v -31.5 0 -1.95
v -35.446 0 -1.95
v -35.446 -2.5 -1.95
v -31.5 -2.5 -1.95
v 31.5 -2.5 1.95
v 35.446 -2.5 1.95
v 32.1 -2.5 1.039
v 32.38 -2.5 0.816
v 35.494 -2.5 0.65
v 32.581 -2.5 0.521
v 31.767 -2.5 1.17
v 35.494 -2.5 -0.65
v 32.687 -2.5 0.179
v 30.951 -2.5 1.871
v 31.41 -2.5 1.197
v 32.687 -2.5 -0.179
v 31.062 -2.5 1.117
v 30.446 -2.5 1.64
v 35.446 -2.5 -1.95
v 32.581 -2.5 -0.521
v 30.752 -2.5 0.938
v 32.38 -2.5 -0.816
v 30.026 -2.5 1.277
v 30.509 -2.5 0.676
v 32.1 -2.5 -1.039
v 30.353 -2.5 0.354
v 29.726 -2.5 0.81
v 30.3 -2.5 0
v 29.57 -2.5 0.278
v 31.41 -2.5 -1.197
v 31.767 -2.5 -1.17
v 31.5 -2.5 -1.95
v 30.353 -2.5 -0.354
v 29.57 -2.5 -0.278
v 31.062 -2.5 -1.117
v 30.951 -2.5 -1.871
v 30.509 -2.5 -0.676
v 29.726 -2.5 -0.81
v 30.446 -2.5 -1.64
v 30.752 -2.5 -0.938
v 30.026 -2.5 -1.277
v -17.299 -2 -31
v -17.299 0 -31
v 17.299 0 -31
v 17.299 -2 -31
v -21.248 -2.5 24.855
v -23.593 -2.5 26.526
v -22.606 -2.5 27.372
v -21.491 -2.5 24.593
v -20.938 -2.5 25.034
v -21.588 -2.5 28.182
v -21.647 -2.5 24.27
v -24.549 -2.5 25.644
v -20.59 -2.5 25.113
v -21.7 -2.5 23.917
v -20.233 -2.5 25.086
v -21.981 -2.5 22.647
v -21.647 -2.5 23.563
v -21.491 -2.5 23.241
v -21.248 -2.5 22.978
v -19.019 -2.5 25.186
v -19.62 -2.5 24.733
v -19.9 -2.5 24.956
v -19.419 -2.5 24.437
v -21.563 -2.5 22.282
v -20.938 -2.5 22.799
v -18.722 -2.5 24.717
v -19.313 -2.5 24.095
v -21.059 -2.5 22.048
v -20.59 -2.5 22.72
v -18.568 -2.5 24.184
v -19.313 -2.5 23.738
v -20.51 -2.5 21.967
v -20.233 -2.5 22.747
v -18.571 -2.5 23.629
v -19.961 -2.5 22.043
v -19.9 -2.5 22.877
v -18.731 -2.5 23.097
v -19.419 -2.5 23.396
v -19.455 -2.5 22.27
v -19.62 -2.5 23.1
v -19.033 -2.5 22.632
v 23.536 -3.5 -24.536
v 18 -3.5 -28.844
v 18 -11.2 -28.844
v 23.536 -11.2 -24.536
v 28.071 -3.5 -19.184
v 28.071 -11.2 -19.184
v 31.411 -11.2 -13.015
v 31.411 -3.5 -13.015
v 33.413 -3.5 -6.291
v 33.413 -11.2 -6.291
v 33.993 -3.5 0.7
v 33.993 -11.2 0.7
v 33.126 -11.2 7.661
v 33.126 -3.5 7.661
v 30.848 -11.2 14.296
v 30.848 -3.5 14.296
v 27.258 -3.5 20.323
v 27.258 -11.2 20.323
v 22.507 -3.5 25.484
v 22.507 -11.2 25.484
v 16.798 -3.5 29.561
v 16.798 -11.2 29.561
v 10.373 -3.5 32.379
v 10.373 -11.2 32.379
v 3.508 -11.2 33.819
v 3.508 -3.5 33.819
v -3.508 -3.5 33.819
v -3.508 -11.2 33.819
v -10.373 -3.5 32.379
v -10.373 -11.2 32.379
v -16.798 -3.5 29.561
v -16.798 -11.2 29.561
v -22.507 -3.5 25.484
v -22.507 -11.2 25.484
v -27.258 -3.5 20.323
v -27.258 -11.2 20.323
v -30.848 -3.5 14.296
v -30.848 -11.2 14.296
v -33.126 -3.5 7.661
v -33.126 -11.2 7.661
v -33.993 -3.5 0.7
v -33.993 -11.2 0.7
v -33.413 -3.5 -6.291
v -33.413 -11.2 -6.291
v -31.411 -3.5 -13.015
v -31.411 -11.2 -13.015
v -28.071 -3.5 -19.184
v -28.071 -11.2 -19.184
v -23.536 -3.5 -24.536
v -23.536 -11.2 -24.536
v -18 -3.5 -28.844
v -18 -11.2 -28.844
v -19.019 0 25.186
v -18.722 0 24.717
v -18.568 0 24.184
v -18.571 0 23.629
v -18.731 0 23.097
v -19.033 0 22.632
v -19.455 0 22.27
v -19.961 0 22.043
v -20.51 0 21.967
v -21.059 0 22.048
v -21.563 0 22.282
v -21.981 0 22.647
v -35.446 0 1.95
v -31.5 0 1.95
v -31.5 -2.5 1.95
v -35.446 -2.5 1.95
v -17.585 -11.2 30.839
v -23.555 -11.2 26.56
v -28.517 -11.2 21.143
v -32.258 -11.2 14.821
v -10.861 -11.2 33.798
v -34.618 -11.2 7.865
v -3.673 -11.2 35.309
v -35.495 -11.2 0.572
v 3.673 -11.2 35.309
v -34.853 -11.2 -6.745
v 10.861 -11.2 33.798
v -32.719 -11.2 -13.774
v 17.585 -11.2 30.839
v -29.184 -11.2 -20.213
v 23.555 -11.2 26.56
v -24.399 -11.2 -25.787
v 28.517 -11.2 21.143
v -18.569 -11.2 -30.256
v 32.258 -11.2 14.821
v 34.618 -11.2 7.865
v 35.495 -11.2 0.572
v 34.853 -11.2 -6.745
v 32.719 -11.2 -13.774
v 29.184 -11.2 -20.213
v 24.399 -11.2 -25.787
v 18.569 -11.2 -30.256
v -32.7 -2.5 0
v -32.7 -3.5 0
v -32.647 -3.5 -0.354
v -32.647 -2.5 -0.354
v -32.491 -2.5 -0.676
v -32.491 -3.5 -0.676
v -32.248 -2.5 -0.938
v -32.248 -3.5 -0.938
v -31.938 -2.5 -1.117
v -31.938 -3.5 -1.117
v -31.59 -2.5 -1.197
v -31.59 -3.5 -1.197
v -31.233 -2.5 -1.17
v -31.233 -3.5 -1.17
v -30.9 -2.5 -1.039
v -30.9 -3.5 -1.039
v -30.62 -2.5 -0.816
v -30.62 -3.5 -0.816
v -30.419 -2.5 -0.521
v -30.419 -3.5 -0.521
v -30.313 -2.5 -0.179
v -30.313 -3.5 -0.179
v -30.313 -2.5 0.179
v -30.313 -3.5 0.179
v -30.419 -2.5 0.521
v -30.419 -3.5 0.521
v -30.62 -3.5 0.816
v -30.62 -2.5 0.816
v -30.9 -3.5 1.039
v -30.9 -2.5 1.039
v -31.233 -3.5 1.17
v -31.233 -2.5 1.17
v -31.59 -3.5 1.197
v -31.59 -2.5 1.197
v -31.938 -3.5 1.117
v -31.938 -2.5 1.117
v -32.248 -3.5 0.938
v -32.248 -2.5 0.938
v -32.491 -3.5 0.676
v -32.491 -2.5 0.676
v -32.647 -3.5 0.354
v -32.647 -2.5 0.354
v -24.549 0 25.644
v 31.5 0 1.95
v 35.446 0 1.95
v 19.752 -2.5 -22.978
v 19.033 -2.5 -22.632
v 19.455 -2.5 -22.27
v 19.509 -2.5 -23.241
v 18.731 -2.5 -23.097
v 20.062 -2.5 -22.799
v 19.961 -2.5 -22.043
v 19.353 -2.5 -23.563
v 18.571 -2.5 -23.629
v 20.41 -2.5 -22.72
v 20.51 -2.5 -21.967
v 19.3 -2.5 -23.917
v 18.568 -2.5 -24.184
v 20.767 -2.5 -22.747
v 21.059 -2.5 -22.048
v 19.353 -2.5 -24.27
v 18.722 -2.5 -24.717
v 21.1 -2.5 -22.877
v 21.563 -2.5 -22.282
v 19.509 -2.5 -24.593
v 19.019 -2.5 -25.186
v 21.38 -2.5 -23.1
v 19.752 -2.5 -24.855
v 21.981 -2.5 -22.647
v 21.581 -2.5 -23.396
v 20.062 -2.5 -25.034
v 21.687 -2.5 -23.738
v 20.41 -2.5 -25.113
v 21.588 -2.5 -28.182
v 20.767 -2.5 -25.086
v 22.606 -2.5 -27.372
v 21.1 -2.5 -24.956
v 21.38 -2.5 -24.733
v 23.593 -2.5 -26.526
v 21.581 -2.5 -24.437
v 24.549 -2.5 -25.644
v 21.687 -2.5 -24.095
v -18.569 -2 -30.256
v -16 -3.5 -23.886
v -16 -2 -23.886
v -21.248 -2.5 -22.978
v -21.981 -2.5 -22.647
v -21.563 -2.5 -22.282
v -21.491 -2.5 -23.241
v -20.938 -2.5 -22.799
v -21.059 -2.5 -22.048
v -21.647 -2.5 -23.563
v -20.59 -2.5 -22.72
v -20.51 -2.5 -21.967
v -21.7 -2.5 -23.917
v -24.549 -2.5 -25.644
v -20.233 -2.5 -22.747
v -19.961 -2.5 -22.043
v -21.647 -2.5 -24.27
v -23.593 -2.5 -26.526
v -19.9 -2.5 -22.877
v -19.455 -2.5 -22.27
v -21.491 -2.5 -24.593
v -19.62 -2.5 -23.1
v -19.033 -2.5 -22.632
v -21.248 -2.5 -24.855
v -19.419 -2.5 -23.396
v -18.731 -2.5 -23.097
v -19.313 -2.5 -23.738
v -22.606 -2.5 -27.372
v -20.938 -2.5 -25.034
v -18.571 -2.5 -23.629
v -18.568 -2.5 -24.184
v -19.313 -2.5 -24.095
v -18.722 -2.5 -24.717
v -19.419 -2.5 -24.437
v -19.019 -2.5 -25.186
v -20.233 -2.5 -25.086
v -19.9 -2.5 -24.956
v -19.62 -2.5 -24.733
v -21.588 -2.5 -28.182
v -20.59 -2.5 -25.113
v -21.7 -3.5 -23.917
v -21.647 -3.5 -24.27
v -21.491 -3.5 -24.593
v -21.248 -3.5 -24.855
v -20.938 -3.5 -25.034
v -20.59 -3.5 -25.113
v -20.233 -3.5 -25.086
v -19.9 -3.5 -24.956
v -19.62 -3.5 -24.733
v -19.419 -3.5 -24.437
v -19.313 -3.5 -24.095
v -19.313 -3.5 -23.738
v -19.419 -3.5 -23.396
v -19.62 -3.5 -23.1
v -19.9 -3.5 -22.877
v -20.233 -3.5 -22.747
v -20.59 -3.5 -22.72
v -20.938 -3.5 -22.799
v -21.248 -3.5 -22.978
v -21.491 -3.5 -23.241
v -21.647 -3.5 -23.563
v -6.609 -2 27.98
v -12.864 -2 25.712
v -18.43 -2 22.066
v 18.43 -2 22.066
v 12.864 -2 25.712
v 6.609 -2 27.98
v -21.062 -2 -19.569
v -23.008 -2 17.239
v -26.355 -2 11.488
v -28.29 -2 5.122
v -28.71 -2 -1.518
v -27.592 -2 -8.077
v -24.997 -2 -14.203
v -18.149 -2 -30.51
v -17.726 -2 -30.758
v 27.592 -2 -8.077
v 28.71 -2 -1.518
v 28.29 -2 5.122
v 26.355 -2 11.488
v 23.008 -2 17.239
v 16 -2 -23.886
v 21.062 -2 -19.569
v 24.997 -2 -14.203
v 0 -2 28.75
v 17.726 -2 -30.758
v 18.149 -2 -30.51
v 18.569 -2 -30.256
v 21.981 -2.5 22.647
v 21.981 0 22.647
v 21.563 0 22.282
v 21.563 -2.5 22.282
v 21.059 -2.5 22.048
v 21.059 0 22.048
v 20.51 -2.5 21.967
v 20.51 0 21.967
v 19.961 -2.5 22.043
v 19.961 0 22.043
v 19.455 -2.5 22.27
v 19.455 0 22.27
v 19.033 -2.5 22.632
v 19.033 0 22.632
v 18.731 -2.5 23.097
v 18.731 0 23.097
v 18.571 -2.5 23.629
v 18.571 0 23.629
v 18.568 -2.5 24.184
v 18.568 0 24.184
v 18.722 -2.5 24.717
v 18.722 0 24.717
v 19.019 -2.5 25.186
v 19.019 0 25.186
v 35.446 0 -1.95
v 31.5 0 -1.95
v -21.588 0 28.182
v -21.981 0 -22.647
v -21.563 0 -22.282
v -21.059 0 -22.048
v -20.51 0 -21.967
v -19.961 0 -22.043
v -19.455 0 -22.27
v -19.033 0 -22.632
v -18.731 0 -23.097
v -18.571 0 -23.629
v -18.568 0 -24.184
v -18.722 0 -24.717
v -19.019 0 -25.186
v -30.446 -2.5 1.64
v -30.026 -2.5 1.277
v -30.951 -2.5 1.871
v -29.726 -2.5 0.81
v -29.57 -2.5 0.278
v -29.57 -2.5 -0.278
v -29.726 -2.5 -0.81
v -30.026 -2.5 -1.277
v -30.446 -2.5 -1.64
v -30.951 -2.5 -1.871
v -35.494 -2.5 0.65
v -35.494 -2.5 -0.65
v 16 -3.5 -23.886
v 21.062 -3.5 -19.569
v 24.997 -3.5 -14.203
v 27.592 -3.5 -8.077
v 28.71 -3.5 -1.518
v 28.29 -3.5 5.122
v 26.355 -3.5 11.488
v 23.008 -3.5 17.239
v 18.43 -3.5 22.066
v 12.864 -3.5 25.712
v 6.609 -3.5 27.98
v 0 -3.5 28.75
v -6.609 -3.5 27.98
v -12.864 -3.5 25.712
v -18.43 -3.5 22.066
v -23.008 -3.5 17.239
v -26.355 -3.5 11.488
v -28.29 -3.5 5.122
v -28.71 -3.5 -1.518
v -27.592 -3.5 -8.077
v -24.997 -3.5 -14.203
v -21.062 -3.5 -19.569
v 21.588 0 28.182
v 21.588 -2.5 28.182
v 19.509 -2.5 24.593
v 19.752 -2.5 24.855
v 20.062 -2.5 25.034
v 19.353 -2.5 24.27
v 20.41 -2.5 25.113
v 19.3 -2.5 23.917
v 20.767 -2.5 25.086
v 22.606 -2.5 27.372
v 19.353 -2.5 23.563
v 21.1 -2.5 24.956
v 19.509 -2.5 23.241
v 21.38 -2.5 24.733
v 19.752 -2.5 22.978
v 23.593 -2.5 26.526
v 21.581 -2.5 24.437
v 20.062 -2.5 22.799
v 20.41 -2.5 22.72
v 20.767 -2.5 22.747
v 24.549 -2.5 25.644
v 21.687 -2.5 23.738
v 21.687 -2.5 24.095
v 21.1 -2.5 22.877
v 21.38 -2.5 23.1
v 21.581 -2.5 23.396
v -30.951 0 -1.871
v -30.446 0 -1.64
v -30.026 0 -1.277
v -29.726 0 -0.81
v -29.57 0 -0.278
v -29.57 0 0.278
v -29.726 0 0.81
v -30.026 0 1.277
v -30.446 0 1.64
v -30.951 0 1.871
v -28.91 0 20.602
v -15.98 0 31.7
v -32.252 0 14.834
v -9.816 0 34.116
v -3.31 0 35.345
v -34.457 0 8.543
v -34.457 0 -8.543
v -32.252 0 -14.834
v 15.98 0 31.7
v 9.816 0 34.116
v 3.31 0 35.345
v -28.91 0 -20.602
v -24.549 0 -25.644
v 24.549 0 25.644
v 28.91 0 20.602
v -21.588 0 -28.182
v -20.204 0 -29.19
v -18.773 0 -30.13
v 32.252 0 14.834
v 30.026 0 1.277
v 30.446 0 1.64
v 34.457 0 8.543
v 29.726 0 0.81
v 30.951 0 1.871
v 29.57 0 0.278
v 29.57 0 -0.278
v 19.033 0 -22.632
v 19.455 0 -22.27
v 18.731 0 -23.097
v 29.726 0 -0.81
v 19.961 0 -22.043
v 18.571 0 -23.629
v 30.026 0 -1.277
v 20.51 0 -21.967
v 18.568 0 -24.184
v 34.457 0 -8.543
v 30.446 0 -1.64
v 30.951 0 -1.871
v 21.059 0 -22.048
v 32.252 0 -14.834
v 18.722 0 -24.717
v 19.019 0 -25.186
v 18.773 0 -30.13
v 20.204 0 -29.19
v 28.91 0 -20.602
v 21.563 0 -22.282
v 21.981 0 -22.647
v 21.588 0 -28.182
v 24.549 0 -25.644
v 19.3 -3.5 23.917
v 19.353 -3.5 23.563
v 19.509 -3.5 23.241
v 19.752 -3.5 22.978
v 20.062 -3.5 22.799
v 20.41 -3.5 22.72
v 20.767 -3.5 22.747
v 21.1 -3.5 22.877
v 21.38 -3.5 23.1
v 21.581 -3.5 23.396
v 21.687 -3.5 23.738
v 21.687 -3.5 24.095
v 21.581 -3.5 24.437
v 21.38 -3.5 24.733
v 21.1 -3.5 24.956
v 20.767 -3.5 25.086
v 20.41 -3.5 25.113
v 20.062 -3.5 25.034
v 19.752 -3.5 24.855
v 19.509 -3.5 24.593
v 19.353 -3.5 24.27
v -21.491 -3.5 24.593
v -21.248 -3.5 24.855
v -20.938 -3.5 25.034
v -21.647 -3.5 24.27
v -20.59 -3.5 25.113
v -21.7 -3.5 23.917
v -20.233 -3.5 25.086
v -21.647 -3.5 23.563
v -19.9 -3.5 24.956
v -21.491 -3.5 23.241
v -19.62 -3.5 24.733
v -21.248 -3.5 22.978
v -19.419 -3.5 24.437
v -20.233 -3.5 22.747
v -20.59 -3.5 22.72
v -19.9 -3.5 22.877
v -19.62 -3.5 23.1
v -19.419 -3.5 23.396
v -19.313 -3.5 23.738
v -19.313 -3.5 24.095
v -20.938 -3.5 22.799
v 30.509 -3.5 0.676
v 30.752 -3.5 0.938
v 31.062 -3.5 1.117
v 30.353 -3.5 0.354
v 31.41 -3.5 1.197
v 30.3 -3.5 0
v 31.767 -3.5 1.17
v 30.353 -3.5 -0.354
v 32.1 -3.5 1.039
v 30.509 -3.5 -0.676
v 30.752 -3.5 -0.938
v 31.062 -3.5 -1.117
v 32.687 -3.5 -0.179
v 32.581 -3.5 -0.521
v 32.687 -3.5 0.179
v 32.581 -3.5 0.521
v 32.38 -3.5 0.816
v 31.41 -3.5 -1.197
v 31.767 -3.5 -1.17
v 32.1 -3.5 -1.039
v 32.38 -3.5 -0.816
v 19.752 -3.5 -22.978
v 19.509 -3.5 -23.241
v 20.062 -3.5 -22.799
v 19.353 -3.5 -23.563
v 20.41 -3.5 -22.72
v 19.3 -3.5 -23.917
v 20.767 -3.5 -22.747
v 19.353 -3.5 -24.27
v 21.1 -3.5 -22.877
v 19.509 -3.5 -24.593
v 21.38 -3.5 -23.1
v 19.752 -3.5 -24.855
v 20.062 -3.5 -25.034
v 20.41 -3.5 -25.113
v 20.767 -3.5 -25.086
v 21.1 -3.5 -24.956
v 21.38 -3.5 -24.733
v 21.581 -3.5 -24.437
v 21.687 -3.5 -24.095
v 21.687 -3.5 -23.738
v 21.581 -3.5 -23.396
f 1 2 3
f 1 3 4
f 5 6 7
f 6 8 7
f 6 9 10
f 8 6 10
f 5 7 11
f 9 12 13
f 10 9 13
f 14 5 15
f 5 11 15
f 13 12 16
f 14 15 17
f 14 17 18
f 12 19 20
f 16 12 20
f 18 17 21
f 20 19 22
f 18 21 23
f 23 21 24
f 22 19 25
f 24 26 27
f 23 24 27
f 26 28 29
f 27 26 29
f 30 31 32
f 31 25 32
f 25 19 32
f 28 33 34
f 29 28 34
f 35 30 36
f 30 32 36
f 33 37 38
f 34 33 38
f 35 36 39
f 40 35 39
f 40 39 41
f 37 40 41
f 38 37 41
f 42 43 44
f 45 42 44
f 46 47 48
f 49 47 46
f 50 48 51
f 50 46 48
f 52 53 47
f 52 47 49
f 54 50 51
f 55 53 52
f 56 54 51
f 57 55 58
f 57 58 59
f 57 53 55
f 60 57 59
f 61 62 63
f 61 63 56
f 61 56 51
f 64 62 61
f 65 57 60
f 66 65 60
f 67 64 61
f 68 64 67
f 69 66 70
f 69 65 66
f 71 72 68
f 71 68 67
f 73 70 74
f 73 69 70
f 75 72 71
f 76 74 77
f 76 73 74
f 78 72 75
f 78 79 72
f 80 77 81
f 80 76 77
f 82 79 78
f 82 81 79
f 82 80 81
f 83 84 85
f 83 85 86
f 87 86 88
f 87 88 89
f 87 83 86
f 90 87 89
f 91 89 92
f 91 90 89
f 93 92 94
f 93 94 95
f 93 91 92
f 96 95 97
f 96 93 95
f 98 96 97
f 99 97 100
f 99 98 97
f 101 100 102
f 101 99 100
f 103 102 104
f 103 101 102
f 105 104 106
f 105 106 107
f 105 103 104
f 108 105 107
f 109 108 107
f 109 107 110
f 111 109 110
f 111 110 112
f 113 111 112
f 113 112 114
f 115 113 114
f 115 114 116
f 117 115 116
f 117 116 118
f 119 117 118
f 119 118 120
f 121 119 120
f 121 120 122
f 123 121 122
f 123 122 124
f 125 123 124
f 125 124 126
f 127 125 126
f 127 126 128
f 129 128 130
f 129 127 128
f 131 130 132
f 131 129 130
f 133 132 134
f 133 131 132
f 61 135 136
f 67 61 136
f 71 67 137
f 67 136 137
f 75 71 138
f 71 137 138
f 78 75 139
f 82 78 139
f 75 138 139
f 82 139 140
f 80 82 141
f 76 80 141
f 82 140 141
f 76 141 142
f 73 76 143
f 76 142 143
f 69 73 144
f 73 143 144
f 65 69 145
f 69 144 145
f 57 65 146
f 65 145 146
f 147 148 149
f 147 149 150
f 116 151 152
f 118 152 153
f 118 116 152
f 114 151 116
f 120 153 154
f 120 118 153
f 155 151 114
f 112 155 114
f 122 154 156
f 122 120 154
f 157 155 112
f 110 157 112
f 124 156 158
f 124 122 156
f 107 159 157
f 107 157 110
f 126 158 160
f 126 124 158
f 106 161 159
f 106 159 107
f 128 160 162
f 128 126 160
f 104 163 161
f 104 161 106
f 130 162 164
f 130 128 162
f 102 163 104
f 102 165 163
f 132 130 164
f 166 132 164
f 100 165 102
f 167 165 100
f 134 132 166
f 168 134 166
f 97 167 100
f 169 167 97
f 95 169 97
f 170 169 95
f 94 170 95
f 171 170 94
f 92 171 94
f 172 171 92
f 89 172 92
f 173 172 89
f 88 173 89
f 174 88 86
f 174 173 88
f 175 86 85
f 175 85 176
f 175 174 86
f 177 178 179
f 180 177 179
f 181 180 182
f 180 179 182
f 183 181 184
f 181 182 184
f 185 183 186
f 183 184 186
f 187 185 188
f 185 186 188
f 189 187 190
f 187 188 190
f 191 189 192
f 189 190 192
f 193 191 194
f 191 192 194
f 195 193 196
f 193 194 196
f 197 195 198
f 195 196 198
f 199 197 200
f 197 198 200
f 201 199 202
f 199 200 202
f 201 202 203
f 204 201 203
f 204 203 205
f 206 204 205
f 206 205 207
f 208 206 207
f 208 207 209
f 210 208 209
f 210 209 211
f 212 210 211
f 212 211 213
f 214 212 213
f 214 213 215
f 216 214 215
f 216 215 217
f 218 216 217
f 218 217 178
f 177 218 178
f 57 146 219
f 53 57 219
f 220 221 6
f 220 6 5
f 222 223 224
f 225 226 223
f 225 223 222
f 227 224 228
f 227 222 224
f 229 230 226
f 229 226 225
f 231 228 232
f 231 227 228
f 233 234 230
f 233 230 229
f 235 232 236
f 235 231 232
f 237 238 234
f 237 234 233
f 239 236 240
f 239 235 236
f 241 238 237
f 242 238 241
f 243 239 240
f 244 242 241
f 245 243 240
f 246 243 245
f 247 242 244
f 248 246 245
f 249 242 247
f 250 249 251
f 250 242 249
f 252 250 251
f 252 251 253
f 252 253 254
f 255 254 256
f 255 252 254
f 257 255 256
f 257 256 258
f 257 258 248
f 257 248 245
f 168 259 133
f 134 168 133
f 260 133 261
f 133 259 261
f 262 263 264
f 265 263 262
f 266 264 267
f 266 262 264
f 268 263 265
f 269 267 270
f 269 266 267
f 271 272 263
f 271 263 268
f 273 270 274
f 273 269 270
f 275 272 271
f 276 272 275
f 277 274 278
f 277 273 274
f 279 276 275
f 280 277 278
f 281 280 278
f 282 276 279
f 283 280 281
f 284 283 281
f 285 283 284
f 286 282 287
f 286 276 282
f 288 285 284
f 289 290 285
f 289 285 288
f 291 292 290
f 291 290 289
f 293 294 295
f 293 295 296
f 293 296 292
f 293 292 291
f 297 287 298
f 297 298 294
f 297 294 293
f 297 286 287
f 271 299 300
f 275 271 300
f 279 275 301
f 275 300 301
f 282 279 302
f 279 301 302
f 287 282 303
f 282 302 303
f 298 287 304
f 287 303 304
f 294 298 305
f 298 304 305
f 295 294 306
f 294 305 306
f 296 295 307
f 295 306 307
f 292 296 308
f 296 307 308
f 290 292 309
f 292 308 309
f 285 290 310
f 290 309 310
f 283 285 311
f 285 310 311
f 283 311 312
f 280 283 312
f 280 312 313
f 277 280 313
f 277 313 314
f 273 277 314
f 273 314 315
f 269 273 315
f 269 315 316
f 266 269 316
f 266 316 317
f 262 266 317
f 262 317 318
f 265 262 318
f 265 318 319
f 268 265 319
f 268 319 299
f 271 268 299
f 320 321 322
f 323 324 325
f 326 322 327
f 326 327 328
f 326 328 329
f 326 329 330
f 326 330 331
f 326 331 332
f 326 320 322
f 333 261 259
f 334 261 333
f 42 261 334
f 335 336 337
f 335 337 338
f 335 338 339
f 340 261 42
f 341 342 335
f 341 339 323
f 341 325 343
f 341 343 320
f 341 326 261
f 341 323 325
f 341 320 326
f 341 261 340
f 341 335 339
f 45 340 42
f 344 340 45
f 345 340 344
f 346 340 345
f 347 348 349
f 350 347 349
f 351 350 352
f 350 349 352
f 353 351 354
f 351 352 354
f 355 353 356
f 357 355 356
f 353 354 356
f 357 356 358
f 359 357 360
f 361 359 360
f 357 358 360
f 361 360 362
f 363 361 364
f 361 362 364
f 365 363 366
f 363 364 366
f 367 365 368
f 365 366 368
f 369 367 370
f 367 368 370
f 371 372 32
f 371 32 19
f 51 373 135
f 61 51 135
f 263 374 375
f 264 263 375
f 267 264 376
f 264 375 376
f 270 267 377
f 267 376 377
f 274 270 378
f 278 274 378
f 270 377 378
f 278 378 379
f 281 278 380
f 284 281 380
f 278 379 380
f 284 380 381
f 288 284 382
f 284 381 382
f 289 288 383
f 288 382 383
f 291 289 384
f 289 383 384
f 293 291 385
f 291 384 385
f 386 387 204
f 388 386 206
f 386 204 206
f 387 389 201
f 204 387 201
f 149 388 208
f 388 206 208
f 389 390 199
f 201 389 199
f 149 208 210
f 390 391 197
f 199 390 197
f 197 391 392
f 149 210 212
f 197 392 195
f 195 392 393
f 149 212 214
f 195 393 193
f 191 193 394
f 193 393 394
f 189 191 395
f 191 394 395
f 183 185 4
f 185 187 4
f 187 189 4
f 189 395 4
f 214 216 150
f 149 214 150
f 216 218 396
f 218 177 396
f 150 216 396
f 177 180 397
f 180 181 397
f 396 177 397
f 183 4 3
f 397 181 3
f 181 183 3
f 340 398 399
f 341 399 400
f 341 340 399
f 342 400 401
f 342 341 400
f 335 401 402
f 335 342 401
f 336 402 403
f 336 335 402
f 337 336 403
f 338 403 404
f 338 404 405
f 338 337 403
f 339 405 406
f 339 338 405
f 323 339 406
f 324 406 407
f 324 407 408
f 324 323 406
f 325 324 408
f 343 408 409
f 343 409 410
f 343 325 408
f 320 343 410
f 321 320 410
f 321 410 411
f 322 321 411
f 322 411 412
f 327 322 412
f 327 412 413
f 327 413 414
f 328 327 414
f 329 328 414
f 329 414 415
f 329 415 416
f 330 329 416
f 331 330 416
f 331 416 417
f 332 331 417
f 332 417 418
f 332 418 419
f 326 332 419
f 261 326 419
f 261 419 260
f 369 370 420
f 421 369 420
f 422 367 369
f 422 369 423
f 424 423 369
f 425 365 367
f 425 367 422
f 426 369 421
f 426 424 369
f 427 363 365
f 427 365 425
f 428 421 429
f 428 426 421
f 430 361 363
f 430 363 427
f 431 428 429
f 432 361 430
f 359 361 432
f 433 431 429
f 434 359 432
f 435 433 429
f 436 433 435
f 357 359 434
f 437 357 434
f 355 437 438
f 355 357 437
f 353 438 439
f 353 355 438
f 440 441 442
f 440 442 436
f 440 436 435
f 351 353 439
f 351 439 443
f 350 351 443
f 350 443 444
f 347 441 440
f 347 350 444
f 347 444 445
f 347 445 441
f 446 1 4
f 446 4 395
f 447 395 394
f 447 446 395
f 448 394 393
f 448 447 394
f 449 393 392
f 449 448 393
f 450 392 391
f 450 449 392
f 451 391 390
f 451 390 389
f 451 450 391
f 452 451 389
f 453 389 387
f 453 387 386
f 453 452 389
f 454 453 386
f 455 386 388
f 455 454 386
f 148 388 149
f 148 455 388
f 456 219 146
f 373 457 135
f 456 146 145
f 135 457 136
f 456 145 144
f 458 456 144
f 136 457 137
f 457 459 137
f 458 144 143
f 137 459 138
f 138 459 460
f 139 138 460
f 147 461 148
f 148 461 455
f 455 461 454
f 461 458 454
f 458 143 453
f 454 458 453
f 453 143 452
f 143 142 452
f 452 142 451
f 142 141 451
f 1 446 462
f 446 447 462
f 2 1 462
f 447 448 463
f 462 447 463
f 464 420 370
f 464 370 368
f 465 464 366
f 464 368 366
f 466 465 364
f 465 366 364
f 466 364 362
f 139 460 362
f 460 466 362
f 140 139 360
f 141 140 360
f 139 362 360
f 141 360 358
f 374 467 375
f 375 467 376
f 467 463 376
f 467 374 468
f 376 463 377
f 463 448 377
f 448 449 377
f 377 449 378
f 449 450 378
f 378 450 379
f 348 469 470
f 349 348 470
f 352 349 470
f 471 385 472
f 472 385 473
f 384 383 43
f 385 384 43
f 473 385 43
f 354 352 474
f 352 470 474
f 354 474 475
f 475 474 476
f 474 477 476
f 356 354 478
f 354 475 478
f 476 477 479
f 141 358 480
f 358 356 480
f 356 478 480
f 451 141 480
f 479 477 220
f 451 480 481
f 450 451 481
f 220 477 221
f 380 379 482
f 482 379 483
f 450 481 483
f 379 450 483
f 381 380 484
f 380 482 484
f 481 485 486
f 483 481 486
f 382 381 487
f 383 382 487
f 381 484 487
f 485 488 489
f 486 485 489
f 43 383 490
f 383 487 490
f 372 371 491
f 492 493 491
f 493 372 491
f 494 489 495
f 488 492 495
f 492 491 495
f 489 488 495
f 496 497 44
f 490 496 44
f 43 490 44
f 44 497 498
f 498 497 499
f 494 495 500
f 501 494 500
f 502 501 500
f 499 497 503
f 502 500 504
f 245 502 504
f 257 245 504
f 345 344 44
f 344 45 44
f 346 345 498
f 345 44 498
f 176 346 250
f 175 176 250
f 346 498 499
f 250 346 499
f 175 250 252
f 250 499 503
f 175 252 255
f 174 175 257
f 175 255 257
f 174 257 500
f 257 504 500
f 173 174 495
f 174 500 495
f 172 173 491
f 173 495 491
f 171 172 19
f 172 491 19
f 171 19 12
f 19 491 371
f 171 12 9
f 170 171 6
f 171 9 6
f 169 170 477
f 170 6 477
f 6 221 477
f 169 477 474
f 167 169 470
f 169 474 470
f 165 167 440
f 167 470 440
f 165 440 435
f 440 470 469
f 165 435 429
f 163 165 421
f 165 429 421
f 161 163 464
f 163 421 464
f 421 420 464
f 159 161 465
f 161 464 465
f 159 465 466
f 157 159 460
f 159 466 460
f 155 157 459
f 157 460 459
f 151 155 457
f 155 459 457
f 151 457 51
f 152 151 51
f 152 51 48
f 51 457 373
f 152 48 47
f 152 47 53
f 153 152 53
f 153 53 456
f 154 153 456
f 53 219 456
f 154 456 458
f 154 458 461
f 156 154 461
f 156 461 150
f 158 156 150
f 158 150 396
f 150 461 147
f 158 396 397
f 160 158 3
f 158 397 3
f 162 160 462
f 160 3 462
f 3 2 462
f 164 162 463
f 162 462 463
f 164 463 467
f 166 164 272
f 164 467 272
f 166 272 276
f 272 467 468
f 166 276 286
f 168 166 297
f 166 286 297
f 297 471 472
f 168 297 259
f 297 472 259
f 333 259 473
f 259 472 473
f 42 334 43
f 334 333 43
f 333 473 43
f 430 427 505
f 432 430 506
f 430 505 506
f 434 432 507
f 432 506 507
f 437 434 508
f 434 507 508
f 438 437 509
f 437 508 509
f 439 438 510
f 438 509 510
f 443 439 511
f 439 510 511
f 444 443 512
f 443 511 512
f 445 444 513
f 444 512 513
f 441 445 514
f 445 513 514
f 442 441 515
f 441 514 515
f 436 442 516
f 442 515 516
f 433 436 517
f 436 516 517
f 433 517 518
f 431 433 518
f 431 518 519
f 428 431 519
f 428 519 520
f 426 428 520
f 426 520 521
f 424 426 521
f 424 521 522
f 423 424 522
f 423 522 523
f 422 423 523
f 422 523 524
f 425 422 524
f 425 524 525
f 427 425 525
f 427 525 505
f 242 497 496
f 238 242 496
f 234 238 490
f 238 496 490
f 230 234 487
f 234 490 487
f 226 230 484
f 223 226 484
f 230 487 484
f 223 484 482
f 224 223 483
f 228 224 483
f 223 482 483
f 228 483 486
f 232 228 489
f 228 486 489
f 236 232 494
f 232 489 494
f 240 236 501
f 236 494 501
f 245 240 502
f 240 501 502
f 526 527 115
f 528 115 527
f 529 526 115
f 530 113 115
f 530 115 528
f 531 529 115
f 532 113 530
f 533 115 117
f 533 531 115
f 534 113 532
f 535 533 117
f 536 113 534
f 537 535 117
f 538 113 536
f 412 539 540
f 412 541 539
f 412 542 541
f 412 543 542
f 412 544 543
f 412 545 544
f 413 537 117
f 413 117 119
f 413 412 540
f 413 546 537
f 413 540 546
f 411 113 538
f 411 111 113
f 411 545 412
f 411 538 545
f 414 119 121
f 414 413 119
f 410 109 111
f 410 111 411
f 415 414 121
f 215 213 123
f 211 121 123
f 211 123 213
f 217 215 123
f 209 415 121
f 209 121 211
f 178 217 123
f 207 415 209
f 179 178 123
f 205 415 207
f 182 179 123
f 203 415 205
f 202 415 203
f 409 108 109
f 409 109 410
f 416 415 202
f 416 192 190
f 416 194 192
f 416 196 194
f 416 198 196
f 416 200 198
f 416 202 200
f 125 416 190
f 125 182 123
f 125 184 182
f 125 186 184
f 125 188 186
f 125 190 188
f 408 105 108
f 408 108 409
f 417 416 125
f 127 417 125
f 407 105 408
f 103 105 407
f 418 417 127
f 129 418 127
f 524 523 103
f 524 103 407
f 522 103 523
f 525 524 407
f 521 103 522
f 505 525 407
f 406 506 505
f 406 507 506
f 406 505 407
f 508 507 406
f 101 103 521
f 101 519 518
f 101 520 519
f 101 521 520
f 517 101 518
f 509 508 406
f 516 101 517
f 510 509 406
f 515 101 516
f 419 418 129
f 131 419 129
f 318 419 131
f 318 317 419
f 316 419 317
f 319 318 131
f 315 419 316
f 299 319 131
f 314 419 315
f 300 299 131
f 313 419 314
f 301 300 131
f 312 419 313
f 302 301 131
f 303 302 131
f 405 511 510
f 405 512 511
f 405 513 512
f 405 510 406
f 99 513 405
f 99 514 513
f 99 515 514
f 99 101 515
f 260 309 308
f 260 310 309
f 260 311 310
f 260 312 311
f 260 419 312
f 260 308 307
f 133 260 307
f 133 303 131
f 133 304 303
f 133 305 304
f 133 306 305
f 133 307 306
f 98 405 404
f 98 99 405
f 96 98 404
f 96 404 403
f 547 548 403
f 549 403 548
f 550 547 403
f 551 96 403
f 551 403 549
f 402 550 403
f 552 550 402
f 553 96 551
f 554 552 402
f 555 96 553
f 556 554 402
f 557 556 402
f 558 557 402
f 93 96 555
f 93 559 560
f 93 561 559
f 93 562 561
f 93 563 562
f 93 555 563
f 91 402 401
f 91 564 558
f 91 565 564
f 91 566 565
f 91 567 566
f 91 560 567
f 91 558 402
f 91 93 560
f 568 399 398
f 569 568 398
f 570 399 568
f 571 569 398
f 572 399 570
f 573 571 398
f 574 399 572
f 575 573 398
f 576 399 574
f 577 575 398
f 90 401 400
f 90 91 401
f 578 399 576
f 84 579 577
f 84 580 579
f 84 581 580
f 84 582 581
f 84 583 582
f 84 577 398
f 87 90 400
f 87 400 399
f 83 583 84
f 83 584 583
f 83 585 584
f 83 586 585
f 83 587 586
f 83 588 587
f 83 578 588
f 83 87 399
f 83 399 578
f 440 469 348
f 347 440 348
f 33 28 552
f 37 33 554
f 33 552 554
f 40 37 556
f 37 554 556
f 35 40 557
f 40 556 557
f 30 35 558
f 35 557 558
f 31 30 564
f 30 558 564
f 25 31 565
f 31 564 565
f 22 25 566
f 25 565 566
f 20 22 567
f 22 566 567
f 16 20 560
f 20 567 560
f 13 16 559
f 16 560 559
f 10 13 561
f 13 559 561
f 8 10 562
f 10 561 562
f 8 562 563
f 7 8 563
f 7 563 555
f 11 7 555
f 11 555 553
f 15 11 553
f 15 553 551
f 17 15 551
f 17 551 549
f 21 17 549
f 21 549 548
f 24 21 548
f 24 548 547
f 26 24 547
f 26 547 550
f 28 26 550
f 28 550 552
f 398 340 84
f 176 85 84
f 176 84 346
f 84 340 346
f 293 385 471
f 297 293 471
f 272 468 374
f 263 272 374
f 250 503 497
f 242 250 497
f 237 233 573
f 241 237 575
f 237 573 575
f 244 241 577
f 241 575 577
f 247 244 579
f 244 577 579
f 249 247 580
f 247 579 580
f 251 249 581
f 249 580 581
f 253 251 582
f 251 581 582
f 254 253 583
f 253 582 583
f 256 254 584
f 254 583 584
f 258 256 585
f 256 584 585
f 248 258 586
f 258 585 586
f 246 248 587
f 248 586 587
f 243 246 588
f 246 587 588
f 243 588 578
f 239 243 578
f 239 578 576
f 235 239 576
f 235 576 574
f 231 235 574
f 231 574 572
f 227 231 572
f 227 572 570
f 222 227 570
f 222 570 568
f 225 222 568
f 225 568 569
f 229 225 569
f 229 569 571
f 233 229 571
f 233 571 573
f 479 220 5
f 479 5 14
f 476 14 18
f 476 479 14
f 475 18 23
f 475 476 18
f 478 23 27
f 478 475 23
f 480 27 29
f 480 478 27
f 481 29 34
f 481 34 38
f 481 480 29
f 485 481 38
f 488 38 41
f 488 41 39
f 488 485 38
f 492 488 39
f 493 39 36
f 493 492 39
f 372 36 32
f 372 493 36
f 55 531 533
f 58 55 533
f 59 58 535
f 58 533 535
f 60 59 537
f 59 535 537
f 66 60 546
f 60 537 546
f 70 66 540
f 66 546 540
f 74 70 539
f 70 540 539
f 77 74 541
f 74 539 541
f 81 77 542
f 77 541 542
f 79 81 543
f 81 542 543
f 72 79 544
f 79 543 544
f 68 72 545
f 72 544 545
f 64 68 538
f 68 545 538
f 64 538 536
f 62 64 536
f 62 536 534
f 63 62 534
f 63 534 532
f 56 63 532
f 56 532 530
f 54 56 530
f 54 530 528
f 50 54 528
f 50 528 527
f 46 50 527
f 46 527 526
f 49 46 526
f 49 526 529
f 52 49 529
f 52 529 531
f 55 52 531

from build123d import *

# Parameters (mm, degrees)
SKETCH1_R            = 35.5
BOSS_EXTRUDE1_DEPTH  = 2
SKETCH2_R            = 35.5
SKETCH2_R_2          = 34
BOSS_EXTRUDE2_DEPTH  = 9.2
SKETCH5_R            = 34
SKETCH5_R_2          = 28.75
BOSS_EXTRUDE3_DEPTH  = 1.5
CUT_EXTRUDE2_REACH   = 53.439
CUT_EXTRUDE3_REACH   = 53.041
M2_CLEARANCE_HOLE1_D = 2.4
SKETCH10_R           = 1.2
CUT_EXTRUDE4_DEPTH   = 2.5


with BuildPart() as part:
    # Sketch1 → Boss-Extrude1 (new body)
    with BuildSketch(Plane.XZ):
        with Locations(Location((0, 0, 0), (0, 0, 270))):
            Circle(SKETCH1_R)
    extrude(amount=BOSS_EXTRUDE1_DEPTH)

    # Sketch2 → Boss-Extrude2 (add)
    with BuildSketch(Plane.XZ.offset(2)):
        with Locations(Location((0, 0, 0), (0, 0, 270))):
            Circle(SKETCH2_R)
        with Locations(Location((0, 0, 0), (0, 0, 270))):
            Circle(SKETCH2_R_2, mode=Mode.SUBTRACT)
    extrude(amount=BOSS_EXTRUDE2_DEPTH)

    # Sketch5 → Boss-Extrude3 (add)
    with BuildSketch(Plane.XZ.offset(2)):
        with Locations(Location((0, 0, 0), (0, 0, 270))):
            Circle(SKETCH5_R)
        with Locations(Location((0, 0, 0), (0, 0, 270))):
            Circle(SKETCH5_R_2, mode=Mode.SUBTRACT)
    extrude(amount=BOSS_EXTRUDE3_DEPTH)

    # Sketch3 → Cut-Extrude2 (cut, up to next)
    with BuildSketch(Plane(origin=(0, 0, 0), x_dir=(1, 0, 0), z_dir=(0, 1, 0)), mode=Mode.PRIVATE) as cut_extrude2_sk1:
        with BuildLine():
            Line((-17.298843892, 31), (17.298843892, 31))
            ThreePointArc((17.298843892, 31), (0, 35.5), (-17.298843892, 31))
        make_face()
    cut_extrude2_tool1 = extrude(cut_extrude2_sk1.sketch, amount=-CUT_EXTRUDE2_REACH, mode=Mode.PRIVATE) & part.part
    add(cut_extrude2_tool1.solids().sort_by_distance((0, 0, -32.810151))[0], mode=Mode.SUBTRACT)

    # Sketch6 → Cut-Extrude3 (cut, up to next)
    with BuildSketch(Plane.XZ.offset(2), mode=Mode.PRIVATE) as cut_extrude3_sk1:
        Polygon((-18.869547058, -31), (-16, -23.886450134), (16, -23.886450134), (18.869547058, -31), align=None)
    cut_extrude3_tool1 = extrude(cut_extrude3_sk1.sketch, amount=CUT_EXTRUDE3_REACH, mode=Mode.PRIVATE) & part.part
    add(cut_extrude3_tool1.solids().sort_by_distance((0, -2, -27.540792))[0], mode=Mode.SUBTRACT)

    # M2 Clearance Hole1 (through all)
    with Locations(Plane(origin=(0, 0, 0), x_dir=(1, 0, 0), z_dir=(0, 1, 0))):
        with Locations((-20.5, 23.916521486), (-31.5, 0), (-20.5, -23.916521486), (31.5, 0), (20.5, 23.916521486), (20.5, -23.916521486)):
            Hole(M2_CLEARANCE_HOLE1_D / 2)

    # Sketch10 → Cut-Extrude4 (cut)
    # profile 1 of 6: a face of its own
    with BuildSketch(Plane(origin=(0, 0, 0), x_dir=(1, 0, 0), z_dir=(0, 1, 0))):
        with BuildLine():
            Line((-35.446403203, 1.95), (-31.5, 1.95))
            ThreePointArc((-31.5, 1.95), (-29.55, 0), (-31.5, -1.95))
            Line((-31.5, -1.95), (-35.446403203, -1.95))
            ThreePointArc((-35.446403203, -1.95), (-35.5, 0), (-35.446403203, 1.95))
        make_face()
        with Locations(Location((-31.5, 0, 0), (0, 0, 270))):
            Circle(SKETCH10_R, mode=Mode.SUBTRACT)
    # profile 2 of 6: a face of its own
    with BuildSketch(Plane(origin=(0, 0, 0), x_dir=(1, 0, 0), z_dir=(0, 1, 0))):
        with BuildLine():
            Line((-24.548840716, 25.643798851), (-21.980546568, 22.647473867))
            ThreePointArc((-21.980546568, 22.647473867), (-19.230952381, 22.435974918), (-19.019453432, 25.185569105))
            Line((-19.019453432, 25.185569105), (-21.58774758, 28.181894089))
            ThreePointArc((-21.58774758, 28.181894089), (-23.103174603, 26.953540088), (-24.548840716, 25.643798851))
        make_face()
        with Locations(Location((-20.5, 23.916521486, 0), (0, 0, 270))):
            Circle(SKETCH10_R, mode=Mode.SUBTRACT)
    # profile 3 of 6: a face of its own
    with BuildSketch(Plane(origin=(0, 0, 0), x_dir=(1, 0, 0), z_dir=(0, 1, 0))):
        with BuildLine():
            Line((-21.58774758, -28.181894089), (-19.019453432, -25.185569105))
            ThreePointArc((-19.019453432, -25.185569105), (-19.230952381, -22.435974918), (-21.980546568, -22.647473867))
            Line((-21.980546568, -22.647473867), (-24.548840716, -25.643798851))
            ThreePointArc((-24.548840716, -25.643798851), (-23.103174603, -26.953540088), (-21.58774758, -28.181894089))
        make_face()
        with Locations(Location((-20.5, -23.916521486, 0), (0, 0, 270))):
            Circle(SKETCH10_R, mode=Mode.SUBTRACT)
    # profile 4 of 6: a face of its own
    with BuildSketch(Plane(origin=(0, 0, 0), x_dir=(1, 0, 0), z_dir=(0, 1, 0))):
        with BuildLine():
            Line((24.548840716, -25.643798851), (21.980546568, -22.647473867))
            ThreePointArc((21.980546568, -22.647473867), (19.230952381, -22.435974918), (19.019453432, -25.185569105))
            Line((19.019453432, -25.185569105), (21.58774758, -28.181894089))
            ThreePointArc((21.58774758, -28.181894089), (23.103174603, -26.953540088), (24.548840716, -25.643798851))
        make_face()
        with Locations(Location((20.5, -23.916521486, 0), (0, 0, 90))):
            Circle(SKETCH10_R, mode=Mode.SUBTRACT)
    # profile 5 of 6: a face of its own
    with BuildSketch(Plane(origin=(0, 0, 0), x_dir=(1, 0, 0), z_dir=(0, 1, 0))):
        with BuildLine():
            Line((21.58774758, 28.181894089), (19.019453432, 25.185569105))
            ThreePointArc((19.019453432, 25.185569105), (19.230952381, 22.435974918), (21.980546568, 22.647473867))
            Line((21.980546568, 22.647473867), (24.548840716, 25.643798851))
            ThreePointArc((24.548840716, 25.643798851), (23.103174603, 26.953540088), (21.58774758, 28.181894089))
        make_face()
        with Locations(Location((20.5, 23.916521486, 0), (0, 0, 90))):
            Circle(SKETCH10_R, mode=Mode.SUBTRACT)
    # profile 6 of 6: a face of its own
    with BuildSketch(Plane(origin=(0, 0, 0), x_dir=(1, 0, 0), z_dir=(0, 1, 0))):
        with BuildLine():
            Line((35.446403203, -1.95), (31.5, -1.95))
            ThreePointArc((31.5, -1.95), (29.55, 0), (31.5, 1.95))
            Line((31.5, 1.95), (35.446403203, 1.95))
            ThreePointArc((35.446403203, 1.95), (35.5, 0), (35.446403203, -1.95))
        make_face()
        with Locations(Location((31.5, 0, 0), (0, 0, 90))):
            Circle(SKETCH10_R, mode=Mode.SUBTRACT)
    extrude(amount=-CUT_EXTRUDE4_DEPTH, mode=Mode.SUBTRACT)


solid = part.part
